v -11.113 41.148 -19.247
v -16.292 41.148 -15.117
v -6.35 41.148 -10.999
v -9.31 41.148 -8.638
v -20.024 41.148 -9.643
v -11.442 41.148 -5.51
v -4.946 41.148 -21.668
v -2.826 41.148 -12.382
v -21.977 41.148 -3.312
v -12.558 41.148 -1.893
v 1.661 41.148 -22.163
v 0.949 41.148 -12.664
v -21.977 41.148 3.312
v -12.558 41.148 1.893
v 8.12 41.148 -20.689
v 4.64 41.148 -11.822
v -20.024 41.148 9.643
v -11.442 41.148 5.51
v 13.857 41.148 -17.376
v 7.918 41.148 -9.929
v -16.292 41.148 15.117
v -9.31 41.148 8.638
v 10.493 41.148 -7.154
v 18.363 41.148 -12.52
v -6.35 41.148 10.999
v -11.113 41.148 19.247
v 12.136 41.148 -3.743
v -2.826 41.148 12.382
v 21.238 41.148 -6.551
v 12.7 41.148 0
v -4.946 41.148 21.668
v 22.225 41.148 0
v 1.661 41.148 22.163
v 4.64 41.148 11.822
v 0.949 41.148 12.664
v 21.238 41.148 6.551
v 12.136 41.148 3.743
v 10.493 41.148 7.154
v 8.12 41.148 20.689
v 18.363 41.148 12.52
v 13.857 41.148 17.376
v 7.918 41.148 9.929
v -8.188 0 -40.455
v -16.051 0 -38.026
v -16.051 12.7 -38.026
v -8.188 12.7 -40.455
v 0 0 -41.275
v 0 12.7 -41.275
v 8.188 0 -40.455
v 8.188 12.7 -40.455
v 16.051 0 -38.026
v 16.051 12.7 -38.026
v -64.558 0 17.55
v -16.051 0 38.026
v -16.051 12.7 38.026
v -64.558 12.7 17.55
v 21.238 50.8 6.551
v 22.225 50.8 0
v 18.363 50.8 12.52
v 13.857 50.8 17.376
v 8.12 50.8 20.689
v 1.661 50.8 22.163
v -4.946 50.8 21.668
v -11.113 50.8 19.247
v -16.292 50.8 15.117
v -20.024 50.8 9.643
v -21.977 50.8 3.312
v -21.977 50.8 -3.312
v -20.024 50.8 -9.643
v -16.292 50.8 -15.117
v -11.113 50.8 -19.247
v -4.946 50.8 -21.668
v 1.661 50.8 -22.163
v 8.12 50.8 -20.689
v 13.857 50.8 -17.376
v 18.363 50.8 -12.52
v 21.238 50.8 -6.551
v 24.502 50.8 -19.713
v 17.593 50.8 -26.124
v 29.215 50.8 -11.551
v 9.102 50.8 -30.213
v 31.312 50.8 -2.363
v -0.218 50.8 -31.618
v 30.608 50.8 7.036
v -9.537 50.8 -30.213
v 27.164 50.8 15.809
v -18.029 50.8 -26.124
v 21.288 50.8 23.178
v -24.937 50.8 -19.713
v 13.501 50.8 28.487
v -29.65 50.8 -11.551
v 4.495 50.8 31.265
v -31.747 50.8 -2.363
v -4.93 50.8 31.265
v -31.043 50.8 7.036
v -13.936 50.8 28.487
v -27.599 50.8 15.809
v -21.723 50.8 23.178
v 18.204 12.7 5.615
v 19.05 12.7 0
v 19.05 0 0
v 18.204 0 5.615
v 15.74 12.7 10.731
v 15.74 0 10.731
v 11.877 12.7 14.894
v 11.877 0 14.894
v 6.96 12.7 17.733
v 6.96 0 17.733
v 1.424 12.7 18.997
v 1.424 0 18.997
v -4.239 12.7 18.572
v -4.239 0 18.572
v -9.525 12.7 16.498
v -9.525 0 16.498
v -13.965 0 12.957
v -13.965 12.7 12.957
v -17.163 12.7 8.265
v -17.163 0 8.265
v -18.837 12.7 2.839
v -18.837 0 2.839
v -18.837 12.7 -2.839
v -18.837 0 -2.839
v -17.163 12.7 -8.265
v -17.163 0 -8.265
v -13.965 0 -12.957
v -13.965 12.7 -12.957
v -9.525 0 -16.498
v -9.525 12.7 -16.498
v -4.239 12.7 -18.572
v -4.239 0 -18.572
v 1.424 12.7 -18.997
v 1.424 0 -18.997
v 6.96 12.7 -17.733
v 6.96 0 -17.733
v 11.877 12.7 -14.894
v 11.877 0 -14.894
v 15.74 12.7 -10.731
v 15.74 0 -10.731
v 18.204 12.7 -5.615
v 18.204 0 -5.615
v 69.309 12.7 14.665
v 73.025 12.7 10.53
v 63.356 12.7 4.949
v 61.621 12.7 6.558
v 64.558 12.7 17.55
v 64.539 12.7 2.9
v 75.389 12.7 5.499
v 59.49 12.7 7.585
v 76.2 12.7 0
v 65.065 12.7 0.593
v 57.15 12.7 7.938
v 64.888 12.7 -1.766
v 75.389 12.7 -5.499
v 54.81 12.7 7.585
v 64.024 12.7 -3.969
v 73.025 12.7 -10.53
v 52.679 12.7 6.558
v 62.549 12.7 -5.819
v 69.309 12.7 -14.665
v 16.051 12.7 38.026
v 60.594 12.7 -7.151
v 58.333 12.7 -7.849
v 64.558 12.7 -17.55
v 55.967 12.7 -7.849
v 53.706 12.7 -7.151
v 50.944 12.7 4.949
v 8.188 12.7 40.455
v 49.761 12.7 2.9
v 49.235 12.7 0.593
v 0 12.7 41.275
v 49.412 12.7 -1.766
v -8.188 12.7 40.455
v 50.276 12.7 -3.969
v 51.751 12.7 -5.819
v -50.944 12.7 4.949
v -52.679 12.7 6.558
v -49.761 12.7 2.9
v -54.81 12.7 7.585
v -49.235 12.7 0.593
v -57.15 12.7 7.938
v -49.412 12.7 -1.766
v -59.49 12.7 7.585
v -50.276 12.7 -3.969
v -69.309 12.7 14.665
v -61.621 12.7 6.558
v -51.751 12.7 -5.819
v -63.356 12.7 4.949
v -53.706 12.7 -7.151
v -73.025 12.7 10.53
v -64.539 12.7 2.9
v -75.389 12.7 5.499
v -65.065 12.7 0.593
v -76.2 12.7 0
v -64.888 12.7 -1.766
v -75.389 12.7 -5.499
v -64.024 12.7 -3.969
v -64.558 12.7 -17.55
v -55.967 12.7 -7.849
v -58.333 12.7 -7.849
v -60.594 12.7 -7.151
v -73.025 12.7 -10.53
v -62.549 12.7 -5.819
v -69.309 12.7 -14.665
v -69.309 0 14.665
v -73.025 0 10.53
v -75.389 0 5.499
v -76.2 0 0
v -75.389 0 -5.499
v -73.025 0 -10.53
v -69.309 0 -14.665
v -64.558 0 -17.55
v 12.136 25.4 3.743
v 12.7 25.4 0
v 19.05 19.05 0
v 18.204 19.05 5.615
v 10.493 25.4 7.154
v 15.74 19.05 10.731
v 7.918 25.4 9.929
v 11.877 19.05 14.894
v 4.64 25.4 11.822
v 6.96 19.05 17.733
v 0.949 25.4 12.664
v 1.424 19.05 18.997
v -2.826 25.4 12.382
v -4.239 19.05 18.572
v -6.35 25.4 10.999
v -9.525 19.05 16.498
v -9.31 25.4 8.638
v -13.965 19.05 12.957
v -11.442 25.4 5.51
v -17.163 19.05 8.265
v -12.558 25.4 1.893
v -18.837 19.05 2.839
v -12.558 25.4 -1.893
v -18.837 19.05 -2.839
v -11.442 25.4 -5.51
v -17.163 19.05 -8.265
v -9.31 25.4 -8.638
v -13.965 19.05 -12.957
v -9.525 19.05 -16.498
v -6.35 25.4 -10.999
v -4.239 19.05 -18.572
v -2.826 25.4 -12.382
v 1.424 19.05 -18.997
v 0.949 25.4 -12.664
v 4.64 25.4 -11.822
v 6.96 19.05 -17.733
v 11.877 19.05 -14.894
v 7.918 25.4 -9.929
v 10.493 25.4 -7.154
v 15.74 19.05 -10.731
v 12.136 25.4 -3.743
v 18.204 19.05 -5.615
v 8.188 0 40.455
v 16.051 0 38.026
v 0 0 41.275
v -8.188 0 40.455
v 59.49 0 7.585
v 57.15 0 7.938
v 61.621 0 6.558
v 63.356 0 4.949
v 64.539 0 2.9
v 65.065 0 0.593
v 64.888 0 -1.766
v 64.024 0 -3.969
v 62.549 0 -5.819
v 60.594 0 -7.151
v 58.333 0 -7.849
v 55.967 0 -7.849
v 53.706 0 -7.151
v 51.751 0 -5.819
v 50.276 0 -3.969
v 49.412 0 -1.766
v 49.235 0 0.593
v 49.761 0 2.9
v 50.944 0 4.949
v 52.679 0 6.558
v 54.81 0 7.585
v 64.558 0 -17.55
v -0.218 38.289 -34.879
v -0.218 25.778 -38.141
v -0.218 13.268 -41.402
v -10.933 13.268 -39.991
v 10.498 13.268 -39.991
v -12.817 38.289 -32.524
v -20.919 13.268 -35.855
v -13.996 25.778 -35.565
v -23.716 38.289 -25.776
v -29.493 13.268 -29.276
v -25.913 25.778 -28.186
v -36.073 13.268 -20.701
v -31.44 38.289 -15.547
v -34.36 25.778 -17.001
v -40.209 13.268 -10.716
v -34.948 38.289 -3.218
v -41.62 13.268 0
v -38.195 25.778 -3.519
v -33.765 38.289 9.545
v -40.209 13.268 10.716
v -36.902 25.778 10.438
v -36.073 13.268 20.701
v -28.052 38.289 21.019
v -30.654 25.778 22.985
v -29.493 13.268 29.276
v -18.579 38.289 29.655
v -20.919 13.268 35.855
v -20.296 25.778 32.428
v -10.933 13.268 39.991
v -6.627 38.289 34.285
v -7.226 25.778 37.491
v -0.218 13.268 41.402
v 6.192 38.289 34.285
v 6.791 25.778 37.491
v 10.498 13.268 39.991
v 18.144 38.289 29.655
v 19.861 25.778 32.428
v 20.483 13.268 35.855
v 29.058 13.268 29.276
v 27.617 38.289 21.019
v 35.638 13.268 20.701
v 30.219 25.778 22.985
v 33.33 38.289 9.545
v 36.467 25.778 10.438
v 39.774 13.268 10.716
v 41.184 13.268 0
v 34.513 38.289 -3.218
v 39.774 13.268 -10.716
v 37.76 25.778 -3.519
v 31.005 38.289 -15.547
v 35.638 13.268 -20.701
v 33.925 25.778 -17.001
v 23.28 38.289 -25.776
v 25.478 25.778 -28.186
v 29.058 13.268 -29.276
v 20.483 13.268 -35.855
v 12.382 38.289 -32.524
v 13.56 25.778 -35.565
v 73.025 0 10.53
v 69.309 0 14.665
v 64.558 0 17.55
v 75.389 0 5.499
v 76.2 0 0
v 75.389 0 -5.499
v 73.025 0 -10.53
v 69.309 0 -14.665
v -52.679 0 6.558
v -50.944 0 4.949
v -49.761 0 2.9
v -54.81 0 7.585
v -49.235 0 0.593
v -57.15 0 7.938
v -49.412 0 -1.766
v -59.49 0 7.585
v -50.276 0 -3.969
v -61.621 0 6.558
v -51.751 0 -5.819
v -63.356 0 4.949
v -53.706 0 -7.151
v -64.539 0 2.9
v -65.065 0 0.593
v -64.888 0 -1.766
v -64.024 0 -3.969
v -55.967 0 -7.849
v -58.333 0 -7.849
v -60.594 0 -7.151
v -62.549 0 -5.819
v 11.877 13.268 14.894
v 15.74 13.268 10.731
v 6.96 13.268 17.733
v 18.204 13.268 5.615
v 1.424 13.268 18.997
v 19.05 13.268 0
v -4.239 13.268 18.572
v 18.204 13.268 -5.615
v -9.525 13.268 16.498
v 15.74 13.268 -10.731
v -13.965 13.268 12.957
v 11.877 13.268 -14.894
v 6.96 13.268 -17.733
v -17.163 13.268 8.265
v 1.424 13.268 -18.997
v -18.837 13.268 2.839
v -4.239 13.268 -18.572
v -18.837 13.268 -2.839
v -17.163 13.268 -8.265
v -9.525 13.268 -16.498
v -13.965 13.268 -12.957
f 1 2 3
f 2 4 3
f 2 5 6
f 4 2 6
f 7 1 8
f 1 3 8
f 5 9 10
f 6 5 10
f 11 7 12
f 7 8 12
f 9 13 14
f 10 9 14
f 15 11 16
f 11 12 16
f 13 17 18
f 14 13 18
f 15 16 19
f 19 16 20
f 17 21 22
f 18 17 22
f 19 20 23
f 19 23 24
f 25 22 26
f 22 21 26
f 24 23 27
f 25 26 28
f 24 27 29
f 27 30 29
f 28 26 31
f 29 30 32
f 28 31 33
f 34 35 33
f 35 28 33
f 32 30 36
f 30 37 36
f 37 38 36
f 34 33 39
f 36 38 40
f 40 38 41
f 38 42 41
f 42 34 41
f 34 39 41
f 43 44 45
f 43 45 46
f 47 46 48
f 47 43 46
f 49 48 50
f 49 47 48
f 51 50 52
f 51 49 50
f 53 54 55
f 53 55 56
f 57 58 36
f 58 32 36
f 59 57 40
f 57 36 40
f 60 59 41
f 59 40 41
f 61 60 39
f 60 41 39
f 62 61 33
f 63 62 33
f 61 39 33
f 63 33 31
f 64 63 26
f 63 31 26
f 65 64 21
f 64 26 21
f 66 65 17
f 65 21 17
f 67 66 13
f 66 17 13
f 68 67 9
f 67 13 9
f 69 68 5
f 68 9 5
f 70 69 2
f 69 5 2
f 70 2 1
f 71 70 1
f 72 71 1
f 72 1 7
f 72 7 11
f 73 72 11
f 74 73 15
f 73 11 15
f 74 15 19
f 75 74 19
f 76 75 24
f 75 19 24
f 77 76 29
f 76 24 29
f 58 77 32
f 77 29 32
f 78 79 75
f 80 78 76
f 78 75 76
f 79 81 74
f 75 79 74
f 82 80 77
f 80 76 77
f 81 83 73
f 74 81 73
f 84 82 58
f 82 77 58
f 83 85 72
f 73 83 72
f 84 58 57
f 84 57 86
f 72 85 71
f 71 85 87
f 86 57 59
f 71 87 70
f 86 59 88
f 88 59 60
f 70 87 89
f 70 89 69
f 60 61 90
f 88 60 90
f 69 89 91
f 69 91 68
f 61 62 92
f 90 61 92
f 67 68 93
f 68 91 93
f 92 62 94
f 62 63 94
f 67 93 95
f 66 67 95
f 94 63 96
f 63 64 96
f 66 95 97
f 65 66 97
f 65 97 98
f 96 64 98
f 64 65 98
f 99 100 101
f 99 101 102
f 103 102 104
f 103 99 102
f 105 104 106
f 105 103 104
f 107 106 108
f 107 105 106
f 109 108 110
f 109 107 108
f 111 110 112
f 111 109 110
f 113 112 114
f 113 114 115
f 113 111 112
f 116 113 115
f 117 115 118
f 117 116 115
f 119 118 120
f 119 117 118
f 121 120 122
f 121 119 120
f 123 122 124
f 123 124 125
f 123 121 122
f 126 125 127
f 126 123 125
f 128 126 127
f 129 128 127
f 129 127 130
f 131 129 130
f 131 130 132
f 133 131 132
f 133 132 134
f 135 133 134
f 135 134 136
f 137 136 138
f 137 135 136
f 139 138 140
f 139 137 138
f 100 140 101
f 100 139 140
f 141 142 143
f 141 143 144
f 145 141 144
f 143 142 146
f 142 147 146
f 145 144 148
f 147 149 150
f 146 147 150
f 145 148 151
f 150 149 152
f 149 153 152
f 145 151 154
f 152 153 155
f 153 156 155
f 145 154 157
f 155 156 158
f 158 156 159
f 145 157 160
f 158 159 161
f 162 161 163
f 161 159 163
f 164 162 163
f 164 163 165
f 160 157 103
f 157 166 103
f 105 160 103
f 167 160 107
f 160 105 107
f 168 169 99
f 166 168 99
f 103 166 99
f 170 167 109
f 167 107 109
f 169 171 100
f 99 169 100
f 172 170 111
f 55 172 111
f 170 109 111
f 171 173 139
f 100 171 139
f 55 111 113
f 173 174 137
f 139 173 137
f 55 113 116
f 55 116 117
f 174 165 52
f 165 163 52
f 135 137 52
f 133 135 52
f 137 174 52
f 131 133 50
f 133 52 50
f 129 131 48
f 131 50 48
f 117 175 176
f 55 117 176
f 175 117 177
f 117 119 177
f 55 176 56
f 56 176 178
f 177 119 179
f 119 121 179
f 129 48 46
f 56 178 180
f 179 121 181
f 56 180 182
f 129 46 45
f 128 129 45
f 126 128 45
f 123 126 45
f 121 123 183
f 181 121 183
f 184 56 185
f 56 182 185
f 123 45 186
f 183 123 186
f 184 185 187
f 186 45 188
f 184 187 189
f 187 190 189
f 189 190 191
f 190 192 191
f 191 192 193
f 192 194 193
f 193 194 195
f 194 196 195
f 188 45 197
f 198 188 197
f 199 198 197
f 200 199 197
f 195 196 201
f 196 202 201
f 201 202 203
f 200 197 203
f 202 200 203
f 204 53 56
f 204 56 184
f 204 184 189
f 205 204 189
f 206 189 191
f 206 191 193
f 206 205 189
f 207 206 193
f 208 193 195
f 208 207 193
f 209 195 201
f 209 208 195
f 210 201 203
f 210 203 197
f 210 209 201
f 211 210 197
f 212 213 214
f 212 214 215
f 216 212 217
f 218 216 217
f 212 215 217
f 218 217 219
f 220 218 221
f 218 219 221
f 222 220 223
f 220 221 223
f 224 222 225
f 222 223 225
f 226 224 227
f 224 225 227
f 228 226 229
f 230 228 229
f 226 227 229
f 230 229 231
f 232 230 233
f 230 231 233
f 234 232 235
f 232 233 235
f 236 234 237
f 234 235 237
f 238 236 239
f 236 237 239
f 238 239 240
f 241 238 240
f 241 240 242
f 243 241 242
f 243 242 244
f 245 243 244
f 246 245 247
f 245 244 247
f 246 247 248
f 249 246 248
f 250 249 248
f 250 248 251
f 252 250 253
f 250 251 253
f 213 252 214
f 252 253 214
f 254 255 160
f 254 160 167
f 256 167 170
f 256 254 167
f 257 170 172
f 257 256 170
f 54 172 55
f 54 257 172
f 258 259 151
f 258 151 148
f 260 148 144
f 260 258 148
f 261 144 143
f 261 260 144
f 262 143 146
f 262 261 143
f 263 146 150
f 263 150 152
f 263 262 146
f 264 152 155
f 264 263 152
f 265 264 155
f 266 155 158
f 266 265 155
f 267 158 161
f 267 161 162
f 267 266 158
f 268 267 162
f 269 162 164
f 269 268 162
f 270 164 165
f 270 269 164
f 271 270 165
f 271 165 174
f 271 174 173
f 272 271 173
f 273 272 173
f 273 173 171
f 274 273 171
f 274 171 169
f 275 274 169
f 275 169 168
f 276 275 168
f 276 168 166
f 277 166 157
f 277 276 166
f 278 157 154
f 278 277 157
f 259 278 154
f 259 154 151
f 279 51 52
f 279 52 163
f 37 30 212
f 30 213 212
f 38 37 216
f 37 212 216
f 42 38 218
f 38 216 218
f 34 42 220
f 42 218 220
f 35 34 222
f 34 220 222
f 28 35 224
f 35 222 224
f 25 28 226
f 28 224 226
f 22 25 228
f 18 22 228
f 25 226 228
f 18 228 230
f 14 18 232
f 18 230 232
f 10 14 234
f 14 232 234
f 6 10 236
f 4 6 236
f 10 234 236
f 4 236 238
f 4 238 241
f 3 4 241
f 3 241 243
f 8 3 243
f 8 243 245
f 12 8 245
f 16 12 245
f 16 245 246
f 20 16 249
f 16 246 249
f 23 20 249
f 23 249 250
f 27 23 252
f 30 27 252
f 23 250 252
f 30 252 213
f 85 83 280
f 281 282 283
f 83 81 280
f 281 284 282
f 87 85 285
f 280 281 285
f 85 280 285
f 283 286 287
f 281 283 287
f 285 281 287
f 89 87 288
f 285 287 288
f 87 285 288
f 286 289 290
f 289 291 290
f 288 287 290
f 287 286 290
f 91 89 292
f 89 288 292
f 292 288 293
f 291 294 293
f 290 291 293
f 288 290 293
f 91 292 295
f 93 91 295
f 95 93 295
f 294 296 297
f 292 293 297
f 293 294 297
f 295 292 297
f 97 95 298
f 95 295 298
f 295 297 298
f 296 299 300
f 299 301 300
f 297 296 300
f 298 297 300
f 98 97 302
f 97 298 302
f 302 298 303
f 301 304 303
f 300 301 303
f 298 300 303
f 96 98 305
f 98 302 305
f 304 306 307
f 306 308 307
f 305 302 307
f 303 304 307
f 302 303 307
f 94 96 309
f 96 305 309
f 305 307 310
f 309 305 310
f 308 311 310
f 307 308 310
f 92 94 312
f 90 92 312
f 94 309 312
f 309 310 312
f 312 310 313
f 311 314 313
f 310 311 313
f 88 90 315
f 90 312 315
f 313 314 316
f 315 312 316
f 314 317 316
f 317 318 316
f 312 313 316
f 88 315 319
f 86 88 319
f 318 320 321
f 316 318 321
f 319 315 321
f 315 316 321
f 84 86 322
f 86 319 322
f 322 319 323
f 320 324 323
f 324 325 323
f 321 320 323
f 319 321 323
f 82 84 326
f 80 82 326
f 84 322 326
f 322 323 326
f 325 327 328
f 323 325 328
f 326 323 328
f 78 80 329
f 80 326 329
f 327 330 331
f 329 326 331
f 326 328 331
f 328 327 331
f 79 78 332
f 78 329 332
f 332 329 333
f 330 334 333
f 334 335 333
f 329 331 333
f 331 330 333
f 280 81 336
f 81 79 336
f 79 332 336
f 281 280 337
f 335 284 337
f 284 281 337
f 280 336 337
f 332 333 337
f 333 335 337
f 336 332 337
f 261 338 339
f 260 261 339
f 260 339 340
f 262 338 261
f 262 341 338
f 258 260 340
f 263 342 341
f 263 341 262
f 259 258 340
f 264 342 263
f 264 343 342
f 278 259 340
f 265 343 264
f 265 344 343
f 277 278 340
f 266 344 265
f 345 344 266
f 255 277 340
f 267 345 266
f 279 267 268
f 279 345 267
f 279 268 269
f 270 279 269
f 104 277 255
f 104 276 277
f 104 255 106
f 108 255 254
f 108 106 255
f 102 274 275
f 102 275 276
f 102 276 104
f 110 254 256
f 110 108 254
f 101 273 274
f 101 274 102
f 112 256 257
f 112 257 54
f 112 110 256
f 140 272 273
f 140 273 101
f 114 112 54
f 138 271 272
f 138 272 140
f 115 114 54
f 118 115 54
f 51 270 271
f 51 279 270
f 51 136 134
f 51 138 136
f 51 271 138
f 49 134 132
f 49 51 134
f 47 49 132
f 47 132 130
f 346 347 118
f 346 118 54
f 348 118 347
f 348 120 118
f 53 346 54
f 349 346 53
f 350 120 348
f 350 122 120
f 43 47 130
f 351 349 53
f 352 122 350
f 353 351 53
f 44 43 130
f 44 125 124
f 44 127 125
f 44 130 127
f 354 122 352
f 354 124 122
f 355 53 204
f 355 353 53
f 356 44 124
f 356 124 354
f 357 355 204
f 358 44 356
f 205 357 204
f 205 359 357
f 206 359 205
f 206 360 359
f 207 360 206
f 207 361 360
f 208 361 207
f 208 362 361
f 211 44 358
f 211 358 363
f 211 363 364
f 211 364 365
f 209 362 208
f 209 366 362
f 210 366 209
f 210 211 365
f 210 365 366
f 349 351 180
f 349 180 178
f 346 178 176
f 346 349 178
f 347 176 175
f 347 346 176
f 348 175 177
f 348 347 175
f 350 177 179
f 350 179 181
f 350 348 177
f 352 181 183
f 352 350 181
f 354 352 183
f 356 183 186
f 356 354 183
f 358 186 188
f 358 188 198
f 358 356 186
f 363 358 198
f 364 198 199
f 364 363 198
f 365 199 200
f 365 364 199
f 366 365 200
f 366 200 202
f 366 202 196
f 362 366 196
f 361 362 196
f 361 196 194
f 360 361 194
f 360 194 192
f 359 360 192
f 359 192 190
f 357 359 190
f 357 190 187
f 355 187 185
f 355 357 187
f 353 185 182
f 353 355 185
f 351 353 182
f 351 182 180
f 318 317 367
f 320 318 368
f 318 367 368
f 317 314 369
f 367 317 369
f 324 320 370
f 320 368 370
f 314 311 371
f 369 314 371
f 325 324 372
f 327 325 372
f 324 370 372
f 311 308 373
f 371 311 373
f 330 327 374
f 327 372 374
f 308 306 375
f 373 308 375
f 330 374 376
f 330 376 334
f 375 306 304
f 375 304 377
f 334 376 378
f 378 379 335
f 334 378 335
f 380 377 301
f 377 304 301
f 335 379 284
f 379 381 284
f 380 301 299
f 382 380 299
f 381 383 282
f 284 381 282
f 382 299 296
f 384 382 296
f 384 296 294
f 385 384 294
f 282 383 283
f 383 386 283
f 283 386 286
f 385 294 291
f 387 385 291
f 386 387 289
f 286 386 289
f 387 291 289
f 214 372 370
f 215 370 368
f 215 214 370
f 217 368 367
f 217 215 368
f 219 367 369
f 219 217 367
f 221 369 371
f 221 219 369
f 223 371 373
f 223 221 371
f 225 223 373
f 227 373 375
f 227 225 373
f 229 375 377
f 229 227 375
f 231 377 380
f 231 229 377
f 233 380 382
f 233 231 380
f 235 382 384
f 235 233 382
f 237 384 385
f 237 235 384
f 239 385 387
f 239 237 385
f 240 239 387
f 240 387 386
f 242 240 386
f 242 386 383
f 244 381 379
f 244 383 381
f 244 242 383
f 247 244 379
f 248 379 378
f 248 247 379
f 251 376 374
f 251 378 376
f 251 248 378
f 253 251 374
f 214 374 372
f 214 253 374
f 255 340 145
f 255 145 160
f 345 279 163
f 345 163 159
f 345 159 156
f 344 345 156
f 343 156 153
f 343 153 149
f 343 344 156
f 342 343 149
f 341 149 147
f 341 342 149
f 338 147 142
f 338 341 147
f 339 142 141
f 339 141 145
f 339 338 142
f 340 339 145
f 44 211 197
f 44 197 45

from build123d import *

# Parameters (mm, degrees)
SKETCH1_R           = 7.9375
BOSS_EXTRUDE1_DEPTH = 12.7


with BuildPart() as part:
    # Sketch1 → Boss-Extrude1 (new body)
    with BuildSketch(Plane(origin=(0, 0, 0), x_dir=(1, 0, 0), z_dir=(0, 1, 0))):
        with BuildLine():
            Line((-64.558333333, 17.550472849), (-16.051388889, 38.026024506))
            ThreePointArc((-16.051388889, 38.026024506), (0, 41.275), (16.051388889, 38.026024506))
            Line((16.051388889, 38.026024506), (64.558333333, 17.550472849))
            ThreePointArc((64.558333333, 17.550472849), (76.2, 0), (64.558333333, -17.550472849))
            Line((64.558333333, -17.550472849), (16.051388889, -38.026024506))
            ThreePointArc((16.051388889, -38.026024506), (0, -41.275), (-16.051388889, -38.026024506))
            Line((-16.051388889, -38.026024506), (-64.558333333, -17.550472849))
            ThreePointArc((-64.558333333, -17.550472849), (-76.2, 0), (-64.558333333, 17.550472849))
        make_face()
        with Locations(Location((-57.15, 0, 0), (0, 0, 270))):
            Circle(SKETCH1_R, mode=Mode.SUBTRACT)
        with Locations(Location((57.15, 0, 0), (0, 0, 270))):
            Circle(SKETCH1_R, mode=Mode.SUBTRACT)
    extrude(amount=BOSS_EXTRUDE1_DEPTH)


with BuildPart() as body_2:
    # Sketch2 → Revolve1 (revolve)
    with BuildSketch(Plane.XY, mode=Mode.PRIVATE) as revolve1_sk:
        Polygon((-0.217540434, 13.267695424), (-0.217540434, 50.8), (31.400329789, 50.8), (41.184459566, 13.267695424), align=None)
    revolve(revolve1_sk.sketch.rotate(Axis((-0.217540434, 13.267695424, 0), (0, 1, 0)), 90), axis=Axis((-0.217540434, 13.267695424, 0), (0, 1, 0)))


with BuildPart() as cut_revolve1_tool:
    # Sketch3 → Cut-Revolve1 (revolve)
    with BuildSketch(Plane.XY):
        Polygon((0, 50.8), (22.225, 50.8), (22.225, 41.148), (12.7, 41.148), (12.7, 25.4), (19.05, 19.05), (19.05, 13.267695424), (19.05, 0), (0, 0), align=None)
    revolve(axis=Axis((0, 50.8, 0), (0, -1, 0)))


with BuildPart() as part_1:
    add(part.part)

    # Cut-Revolve1: cut by cut_revolve1_tool
    add(cut_revolve1_tool.part, mode=Mode.SUBTRACT)


with BuildPart() as body_2_1:
    add(body_2.part)

    # Cut-Revolve1: cut by cut_revolve1_tool
    add(cut_revolve1_tool.part, mode=Mode.SUBTRACT)


solid = Compound([part_1.part, body_2_1.part])
